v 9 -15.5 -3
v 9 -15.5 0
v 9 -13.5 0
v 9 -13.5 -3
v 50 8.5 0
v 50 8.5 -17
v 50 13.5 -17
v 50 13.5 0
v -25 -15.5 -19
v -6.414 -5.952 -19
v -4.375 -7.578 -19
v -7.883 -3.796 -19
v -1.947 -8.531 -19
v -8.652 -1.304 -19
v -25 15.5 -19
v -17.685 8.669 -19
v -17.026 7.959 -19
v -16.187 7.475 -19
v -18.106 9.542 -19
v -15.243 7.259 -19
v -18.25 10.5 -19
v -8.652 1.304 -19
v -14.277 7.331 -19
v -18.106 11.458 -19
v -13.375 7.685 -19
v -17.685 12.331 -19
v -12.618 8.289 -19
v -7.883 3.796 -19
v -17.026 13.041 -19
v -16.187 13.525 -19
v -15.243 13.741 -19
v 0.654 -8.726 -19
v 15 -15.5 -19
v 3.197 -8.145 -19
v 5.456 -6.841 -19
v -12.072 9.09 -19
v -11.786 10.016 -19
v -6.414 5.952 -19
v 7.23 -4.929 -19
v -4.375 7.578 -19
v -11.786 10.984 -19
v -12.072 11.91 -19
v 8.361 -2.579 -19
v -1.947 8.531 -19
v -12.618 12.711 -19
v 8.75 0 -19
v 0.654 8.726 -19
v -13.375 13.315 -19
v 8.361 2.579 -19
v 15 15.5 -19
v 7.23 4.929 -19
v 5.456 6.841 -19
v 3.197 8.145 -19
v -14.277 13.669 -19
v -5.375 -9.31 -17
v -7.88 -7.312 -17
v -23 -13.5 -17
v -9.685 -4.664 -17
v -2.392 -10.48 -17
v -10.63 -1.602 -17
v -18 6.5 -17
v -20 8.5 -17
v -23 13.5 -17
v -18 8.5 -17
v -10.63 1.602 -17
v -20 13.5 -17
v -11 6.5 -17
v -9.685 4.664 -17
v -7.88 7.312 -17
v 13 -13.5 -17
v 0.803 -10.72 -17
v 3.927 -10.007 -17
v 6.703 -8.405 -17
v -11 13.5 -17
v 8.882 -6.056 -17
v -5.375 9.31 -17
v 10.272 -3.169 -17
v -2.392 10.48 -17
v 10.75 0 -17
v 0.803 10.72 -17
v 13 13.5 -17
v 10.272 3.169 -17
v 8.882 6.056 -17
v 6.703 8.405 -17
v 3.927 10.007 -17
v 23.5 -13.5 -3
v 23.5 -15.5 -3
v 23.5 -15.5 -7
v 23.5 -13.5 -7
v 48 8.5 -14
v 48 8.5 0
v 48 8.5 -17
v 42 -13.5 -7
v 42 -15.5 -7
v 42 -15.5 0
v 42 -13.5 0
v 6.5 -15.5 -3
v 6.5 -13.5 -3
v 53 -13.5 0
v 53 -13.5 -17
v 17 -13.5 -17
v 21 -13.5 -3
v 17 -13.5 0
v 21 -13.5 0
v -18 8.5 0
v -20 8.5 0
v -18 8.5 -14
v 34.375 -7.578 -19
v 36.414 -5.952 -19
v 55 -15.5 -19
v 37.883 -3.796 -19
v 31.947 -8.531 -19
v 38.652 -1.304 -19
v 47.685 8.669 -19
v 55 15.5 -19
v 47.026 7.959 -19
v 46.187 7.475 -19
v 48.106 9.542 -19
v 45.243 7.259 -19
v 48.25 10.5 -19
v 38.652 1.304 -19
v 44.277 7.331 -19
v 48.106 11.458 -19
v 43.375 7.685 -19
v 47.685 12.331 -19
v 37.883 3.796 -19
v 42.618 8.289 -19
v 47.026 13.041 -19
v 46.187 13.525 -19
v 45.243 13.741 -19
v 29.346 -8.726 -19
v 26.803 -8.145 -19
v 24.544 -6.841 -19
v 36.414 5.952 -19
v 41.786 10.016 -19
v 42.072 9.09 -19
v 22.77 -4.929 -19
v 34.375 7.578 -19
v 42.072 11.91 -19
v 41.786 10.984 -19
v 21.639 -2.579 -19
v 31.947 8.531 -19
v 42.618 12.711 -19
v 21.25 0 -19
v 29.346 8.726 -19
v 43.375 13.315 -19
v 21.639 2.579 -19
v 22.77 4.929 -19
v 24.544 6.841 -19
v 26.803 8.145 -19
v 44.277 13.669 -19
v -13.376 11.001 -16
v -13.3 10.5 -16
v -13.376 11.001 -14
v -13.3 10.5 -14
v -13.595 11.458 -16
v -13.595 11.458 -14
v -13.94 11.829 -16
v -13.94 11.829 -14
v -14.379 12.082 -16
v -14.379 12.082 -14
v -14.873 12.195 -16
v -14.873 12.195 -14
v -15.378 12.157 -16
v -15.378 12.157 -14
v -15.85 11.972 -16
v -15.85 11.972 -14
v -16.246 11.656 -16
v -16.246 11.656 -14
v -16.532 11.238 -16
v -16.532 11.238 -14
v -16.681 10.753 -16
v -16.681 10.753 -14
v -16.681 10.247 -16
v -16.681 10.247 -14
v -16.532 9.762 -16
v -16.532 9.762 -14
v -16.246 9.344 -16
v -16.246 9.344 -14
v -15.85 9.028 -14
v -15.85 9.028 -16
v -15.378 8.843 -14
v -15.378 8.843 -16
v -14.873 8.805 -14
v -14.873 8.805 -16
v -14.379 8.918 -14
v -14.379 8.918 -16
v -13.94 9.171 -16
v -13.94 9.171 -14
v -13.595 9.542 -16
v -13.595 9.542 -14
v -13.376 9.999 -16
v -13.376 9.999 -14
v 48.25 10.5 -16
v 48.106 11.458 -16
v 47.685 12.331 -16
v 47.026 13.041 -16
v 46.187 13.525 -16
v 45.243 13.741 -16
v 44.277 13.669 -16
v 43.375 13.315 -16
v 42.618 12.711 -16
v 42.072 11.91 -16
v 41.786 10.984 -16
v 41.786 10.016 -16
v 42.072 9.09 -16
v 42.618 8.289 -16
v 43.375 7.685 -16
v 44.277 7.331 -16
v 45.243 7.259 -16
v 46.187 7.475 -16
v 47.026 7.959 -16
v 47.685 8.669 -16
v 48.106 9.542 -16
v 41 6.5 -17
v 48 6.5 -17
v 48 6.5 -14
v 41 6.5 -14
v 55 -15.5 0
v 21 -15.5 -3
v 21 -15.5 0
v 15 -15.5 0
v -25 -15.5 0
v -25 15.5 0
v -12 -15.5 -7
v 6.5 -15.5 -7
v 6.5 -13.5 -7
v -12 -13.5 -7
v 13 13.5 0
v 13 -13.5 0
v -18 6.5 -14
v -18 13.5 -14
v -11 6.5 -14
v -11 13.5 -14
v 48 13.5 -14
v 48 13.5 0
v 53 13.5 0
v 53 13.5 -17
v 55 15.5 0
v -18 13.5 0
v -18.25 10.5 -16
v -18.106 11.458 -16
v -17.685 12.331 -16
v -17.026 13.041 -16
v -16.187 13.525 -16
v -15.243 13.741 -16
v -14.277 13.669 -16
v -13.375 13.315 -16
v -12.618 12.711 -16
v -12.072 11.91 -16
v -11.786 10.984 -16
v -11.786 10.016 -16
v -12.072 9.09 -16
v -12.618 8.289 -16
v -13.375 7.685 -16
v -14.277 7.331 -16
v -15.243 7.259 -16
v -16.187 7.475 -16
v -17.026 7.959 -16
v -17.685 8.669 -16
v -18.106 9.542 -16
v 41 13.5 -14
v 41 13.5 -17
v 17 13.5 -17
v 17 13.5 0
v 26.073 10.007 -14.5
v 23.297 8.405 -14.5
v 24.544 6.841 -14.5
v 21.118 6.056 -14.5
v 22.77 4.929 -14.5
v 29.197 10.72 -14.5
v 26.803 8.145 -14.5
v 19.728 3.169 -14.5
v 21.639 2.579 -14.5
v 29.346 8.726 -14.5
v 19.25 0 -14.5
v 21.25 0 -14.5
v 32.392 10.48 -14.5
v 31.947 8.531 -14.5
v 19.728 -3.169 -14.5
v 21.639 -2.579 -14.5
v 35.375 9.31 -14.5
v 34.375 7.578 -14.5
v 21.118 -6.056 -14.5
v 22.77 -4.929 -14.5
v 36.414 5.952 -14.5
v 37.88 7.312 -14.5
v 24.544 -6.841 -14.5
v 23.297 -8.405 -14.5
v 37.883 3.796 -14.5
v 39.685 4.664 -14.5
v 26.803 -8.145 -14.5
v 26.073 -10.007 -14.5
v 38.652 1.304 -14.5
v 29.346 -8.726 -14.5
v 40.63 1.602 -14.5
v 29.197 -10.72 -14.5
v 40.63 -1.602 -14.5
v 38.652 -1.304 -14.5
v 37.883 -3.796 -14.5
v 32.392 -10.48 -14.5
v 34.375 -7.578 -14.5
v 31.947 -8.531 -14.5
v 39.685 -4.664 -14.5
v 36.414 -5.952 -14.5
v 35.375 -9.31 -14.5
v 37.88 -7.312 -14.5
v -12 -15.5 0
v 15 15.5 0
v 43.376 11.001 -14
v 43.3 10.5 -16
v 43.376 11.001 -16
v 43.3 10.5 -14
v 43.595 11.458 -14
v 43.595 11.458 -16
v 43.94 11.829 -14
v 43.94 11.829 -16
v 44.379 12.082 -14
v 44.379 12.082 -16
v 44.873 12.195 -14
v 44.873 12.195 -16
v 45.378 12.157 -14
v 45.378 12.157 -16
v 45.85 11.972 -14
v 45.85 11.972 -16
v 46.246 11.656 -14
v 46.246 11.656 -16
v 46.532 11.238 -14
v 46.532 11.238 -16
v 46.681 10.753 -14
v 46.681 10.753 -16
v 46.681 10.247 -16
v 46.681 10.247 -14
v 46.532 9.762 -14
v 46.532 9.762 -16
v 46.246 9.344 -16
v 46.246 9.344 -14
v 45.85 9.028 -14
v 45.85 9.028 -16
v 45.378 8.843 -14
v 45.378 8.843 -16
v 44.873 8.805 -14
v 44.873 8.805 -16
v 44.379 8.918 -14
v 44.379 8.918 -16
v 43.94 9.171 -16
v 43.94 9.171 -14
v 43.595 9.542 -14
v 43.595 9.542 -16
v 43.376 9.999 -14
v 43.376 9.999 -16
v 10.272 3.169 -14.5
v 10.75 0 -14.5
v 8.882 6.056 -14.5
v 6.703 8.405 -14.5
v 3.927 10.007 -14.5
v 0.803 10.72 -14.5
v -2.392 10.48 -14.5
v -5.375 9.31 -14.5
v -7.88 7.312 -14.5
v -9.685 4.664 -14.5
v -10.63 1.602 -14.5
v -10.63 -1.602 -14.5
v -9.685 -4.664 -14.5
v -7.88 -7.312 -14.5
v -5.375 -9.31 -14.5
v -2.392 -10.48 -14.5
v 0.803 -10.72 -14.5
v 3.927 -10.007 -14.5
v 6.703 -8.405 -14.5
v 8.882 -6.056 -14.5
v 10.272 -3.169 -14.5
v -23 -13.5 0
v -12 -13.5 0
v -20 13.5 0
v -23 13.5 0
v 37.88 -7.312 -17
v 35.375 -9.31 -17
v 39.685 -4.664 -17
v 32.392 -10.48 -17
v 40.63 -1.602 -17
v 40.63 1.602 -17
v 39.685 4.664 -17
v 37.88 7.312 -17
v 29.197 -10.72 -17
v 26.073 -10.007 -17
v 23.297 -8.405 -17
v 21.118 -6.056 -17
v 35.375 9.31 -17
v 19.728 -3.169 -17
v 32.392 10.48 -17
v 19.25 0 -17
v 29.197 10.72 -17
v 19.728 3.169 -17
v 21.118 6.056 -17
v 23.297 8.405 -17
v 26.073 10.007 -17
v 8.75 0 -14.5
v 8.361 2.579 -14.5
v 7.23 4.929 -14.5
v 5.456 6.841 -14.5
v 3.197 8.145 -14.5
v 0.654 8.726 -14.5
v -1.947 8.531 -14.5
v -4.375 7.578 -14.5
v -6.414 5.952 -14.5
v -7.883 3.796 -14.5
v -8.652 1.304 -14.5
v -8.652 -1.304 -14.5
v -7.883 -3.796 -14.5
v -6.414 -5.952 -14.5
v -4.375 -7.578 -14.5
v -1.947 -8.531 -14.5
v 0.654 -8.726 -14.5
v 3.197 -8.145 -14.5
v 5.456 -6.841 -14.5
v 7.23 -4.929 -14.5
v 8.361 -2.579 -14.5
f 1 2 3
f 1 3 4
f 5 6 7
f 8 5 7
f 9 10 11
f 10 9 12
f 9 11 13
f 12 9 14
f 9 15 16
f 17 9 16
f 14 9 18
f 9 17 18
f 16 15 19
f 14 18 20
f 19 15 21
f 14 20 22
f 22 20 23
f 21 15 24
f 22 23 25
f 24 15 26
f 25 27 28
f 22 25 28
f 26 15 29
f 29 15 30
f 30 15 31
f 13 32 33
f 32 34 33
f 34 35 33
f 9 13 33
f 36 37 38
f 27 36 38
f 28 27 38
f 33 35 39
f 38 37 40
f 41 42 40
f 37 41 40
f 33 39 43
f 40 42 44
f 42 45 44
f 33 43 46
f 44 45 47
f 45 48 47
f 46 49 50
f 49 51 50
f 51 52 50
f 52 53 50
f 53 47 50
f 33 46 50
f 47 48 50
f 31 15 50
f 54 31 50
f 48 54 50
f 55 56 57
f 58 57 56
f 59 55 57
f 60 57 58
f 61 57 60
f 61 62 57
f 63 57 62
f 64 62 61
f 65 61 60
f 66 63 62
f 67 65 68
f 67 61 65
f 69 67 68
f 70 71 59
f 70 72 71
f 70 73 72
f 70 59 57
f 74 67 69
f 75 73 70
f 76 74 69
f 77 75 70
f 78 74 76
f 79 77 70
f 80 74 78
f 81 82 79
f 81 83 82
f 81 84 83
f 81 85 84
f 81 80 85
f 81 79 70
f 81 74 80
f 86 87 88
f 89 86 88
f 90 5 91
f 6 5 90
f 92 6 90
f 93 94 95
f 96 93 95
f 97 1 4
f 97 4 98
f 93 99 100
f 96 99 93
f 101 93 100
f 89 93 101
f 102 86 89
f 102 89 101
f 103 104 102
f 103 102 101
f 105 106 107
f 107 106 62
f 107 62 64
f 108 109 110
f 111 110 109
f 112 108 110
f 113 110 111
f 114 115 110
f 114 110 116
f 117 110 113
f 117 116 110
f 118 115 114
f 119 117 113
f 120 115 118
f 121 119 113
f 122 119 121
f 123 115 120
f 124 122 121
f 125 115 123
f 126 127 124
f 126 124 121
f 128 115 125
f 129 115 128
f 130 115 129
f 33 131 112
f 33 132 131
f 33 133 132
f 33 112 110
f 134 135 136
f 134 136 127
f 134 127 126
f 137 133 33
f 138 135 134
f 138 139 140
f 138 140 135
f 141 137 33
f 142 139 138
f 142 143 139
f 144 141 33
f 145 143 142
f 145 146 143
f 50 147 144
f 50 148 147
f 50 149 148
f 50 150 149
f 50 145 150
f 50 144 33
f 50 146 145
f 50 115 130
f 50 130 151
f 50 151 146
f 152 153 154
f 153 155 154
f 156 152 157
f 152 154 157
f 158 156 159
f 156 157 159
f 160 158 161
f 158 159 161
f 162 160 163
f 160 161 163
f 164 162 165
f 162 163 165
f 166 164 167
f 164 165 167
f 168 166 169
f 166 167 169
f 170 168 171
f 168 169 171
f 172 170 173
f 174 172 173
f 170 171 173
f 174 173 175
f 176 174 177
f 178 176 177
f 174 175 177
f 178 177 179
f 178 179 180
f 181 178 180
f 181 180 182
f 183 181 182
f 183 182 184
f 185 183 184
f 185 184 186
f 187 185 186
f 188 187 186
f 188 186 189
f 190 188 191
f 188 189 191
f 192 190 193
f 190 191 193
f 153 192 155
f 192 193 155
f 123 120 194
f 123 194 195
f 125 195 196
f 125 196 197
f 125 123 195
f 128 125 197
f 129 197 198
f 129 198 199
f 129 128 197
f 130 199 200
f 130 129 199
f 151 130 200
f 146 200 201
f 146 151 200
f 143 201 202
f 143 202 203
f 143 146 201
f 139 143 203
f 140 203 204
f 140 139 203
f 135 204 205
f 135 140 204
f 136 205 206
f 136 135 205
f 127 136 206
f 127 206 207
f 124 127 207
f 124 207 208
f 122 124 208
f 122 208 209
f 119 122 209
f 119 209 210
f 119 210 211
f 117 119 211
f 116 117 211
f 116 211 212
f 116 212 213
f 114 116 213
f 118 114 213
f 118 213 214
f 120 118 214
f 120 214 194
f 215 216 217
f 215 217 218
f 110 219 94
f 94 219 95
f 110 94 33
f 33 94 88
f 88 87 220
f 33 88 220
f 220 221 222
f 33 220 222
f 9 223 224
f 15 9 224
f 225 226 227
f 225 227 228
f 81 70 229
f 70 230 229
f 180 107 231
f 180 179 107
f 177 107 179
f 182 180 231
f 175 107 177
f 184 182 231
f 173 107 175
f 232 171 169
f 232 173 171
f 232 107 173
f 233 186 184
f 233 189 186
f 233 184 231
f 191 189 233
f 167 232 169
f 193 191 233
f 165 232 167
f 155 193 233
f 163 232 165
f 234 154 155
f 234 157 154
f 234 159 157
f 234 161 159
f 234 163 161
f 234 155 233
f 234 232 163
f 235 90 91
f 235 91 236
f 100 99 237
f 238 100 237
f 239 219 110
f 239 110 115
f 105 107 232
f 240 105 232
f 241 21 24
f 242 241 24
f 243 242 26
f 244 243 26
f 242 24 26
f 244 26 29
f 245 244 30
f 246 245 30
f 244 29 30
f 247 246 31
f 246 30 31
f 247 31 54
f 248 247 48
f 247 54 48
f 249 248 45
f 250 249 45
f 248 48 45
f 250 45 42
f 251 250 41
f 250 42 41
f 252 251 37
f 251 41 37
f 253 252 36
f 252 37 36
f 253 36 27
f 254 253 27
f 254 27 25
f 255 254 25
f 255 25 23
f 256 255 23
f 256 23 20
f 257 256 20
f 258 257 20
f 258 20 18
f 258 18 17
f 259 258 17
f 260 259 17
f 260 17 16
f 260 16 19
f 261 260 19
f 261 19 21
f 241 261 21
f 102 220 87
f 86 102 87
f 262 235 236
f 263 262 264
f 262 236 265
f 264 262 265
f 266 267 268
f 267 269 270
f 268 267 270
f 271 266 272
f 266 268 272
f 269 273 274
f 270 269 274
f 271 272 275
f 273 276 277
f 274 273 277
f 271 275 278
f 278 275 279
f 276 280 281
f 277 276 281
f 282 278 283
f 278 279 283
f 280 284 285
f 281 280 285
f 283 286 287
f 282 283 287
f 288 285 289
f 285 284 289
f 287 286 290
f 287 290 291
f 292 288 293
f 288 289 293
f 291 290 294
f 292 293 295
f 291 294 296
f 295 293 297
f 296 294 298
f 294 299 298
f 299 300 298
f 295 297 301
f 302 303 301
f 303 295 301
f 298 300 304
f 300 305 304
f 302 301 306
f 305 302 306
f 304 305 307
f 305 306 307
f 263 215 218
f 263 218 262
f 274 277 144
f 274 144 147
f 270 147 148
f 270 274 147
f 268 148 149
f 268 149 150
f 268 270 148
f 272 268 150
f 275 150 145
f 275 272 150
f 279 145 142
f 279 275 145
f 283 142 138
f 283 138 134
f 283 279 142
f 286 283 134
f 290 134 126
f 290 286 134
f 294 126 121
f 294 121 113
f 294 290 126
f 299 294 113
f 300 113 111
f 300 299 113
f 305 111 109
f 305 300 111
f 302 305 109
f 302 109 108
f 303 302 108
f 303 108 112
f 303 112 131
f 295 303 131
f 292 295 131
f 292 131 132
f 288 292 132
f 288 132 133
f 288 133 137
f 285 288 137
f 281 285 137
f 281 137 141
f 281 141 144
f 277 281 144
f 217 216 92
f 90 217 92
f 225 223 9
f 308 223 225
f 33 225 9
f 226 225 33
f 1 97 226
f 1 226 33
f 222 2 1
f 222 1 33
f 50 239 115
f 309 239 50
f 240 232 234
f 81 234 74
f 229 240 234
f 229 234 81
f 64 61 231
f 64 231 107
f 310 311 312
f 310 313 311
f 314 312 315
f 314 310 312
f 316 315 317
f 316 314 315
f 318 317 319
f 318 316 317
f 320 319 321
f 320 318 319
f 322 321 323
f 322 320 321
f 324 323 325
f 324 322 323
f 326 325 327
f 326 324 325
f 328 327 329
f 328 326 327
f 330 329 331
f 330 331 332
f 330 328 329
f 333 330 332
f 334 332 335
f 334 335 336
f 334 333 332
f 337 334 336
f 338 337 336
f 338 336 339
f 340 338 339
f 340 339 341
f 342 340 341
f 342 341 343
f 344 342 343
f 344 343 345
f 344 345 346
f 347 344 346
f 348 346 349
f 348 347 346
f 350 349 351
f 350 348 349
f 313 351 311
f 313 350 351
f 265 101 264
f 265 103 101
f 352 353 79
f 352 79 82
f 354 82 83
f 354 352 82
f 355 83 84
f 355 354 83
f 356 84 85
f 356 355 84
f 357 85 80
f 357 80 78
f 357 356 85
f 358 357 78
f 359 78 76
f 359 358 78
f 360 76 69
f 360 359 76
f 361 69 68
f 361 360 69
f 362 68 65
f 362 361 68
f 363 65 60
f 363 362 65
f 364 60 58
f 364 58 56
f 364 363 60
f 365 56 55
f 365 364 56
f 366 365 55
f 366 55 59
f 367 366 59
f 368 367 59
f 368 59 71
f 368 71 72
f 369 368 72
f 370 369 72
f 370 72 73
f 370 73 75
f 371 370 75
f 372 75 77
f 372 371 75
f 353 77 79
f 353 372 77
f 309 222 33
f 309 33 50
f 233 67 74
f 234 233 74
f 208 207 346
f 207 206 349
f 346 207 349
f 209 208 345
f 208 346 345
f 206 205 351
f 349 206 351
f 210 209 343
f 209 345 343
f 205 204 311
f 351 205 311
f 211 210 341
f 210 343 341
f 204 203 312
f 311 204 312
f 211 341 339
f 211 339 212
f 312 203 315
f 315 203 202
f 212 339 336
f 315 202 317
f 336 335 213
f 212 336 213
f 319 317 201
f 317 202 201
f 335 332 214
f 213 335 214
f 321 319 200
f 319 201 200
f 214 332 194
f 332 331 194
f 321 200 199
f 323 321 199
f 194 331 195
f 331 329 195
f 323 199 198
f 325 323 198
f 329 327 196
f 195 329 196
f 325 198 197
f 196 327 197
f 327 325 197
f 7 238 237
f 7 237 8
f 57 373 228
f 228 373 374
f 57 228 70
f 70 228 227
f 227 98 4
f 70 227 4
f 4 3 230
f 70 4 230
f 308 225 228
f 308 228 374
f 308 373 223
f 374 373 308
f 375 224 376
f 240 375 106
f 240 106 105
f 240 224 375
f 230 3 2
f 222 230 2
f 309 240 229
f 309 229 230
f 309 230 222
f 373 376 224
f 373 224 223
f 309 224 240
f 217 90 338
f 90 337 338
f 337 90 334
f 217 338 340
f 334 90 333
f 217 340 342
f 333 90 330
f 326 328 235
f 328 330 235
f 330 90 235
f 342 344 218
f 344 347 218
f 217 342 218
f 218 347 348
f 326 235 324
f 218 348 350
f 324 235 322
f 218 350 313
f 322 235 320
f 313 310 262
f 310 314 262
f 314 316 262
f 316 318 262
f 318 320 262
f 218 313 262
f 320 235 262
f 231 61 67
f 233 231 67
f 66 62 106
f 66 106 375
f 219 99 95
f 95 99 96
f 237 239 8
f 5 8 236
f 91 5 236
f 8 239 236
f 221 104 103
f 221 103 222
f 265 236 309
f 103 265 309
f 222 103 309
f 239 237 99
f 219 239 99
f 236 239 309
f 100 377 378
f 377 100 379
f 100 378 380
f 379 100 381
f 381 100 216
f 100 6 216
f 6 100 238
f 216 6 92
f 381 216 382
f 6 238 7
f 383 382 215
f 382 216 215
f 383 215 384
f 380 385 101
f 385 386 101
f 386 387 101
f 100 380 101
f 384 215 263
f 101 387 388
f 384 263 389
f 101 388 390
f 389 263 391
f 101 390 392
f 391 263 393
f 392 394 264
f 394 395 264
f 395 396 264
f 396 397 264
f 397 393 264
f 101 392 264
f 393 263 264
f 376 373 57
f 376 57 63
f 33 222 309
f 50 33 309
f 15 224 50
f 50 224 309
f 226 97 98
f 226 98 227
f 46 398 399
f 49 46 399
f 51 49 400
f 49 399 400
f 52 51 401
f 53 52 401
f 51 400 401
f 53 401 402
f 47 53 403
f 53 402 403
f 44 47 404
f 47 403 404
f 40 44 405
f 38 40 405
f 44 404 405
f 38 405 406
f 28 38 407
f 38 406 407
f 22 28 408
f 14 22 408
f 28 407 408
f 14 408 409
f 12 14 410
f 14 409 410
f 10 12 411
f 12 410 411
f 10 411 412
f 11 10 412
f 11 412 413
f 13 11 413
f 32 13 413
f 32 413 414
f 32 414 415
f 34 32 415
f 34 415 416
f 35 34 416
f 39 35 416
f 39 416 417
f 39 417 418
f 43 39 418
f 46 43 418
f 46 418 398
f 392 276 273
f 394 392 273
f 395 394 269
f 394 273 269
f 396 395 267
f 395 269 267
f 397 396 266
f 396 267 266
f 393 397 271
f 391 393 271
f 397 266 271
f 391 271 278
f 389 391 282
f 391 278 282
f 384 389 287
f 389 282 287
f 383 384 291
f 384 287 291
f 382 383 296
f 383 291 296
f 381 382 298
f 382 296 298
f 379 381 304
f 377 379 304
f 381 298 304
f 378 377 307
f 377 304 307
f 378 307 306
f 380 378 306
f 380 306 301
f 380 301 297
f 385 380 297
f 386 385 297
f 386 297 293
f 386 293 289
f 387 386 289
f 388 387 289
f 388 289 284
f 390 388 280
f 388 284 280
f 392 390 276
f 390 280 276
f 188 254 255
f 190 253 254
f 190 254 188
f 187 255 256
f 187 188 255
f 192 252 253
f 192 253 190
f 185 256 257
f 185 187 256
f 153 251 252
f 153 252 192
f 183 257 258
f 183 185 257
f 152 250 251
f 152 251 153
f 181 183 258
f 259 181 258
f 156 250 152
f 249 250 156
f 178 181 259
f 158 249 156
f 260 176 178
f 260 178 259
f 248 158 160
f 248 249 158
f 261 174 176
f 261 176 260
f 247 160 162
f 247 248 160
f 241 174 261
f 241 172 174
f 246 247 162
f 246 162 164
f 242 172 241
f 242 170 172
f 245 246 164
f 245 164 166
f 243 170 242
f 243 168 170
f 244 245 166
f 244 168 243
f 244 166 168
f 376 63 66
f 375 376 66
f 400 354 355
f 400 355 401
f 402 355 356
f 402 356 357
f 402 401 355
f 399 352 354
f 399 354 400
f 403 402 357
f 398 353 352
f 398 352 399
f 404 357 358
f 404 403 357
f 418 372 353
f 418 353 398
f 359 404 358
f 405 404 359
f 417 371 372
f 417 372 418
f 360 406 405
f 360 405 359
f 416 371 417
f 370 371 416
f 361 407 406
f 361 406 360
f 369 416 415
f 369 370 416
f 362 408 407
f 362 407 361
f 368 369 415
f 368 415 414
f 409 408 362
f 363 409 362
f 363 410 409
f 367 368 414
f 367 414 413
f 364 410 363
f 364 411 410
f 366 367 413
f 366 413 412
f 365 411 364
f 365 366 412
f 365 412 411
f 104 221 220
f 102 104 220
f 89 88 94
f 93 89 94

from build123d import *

# Parameters (mm, degrees)
SKETCH1_W                      = 40
SKETCH1_H                      = 31
SKETCH1_R                      = 8.75
BOSS_EXTRUDE1_DEPTH            = 19
SHELL1_T                       = -2
SKETCH2_R                      = 10.75
SKETCH2_R_2                    = 8.75
CUT_EXTRUDE1_DEPTH             = 14.5
SKETCH3_W                      = 2
SKETCH3_H                      = 5
BOSS_EXTRUDE2_DEPTH            = 17
SKETCH8_W                      = 7
SKETCH8_H                      = 7
BOSS_EXTRUDE3_DEPTH            = 3
CBORE_FOR_M3_SHCS1_D           = 3.4
CBORE_FOR_M3_SHCS1_CBORE_D     = 6.5
CBORE_FOR_M3_SHCS1_CBORE_DEPTH = 3
CUT_EXTRUDE3_REACH             = 46.125


with BuildPart() as part:
    # Sketch1 → Boss-Extrude1 (new body)
    with BuildSketch(Plane.XY):
        with Locations((-5, 0)):
            Rectangle(SKETCH1_W, SKETCH1_H)
        Circle(SKETCH1_R, mode=Mode.SUBTRACT)
    extrude(amount=-BOSS_EXTRUDE1_DEPTH)

    # Shell1
    shell1_openings = [part.faces().sort_by_distance(p)[0] for p in [
        (-5, -14.993936763, 0),
    ]]
    offset(amount=SHELL1_T, openings=shell1_openings, kind=Kind.INTERSECTION)

    # Sketch2 → Cut-Extrude1 (cut)
    with BuildSketch(Plane.XY):
        with Locations(Location((0, 0, 0), (0, 0, 180))):
            Circle(SKETCH2_R)
        Circle(SKETCH2_R_2, mode=Mode.SUBTRACT)
    extrude(amount=-CUT_EXTRUDE1_DEPTH, mode=Mode.SUBTRACT)

    # Sketch3 → Boss-Extrude2 (add)
    with BuildSketch(Plane.XY.offset(-17)):
        with Locations((-19, 11)):
            Rectangle(SKETCH3_W, SKETCH3_H)
    extrude(amount=BOSS_EXTRUDE2_DEPTH)

    # Sketch8 → Boss-Extrude3 (add)
    with BuildSketch(Plane.XY.offset(-17)):
        with Locations((-14.5, 10)):
            Rectangle(SKETCH8_W, SKETCH8_H)
    extrude(amount=BOSS_EXTRUDE3_DEPTH)

    # CBORE for M3 SHCS1 (through all)
    with Locations(Plane(origin=(0, 0, -19), x_dir=(-1, 0, 0), z_dir=(0, 0, -1))):
        with Locations((15, 10.5)):
            CounterBoreHole(CBORE_FOR_M3_SHCS1_D / 2, CBORE_FOR_M3_SHCS1_CBORE_D / 2, CBORE_FOR_M3_SHCS1_CBORE_DEPTH)

    # Sketch9 → Cut-Extrude3 (cut, up to next)
    with BuildSketch(Plane.XZ.offset(15.5), mode=Mode.PRIVATE) as cut_extrude3_sk1:
        Polygon((-12, 0), (6.5, 0), (9, 0), (9, -3), (6.5, -3), (6.5, -7), (-12, -7), align=None)
    cut_extrude3_tool1 = extrude(cut_extrude3_sk1.sketch, amount=-CUT_EXTRUDE3_REACH, mode=Mode.PRIVATE) & part.part
    add(cut_extrude3_tool1.solids().sort_by_distance((-2.175182, -15.5, -3.390511))[0], mode=Mode.SUBTRACT)


with BuildPart() as body_2:
    # Mirror2: mirrored copy
    add(part.part.mirror(Plane(origin=(15, -15.5, -19), x_dir=(0, 0, 1), z_dir=(1, 0, 0))))


solid = Compound([part.part, body_2.part])
